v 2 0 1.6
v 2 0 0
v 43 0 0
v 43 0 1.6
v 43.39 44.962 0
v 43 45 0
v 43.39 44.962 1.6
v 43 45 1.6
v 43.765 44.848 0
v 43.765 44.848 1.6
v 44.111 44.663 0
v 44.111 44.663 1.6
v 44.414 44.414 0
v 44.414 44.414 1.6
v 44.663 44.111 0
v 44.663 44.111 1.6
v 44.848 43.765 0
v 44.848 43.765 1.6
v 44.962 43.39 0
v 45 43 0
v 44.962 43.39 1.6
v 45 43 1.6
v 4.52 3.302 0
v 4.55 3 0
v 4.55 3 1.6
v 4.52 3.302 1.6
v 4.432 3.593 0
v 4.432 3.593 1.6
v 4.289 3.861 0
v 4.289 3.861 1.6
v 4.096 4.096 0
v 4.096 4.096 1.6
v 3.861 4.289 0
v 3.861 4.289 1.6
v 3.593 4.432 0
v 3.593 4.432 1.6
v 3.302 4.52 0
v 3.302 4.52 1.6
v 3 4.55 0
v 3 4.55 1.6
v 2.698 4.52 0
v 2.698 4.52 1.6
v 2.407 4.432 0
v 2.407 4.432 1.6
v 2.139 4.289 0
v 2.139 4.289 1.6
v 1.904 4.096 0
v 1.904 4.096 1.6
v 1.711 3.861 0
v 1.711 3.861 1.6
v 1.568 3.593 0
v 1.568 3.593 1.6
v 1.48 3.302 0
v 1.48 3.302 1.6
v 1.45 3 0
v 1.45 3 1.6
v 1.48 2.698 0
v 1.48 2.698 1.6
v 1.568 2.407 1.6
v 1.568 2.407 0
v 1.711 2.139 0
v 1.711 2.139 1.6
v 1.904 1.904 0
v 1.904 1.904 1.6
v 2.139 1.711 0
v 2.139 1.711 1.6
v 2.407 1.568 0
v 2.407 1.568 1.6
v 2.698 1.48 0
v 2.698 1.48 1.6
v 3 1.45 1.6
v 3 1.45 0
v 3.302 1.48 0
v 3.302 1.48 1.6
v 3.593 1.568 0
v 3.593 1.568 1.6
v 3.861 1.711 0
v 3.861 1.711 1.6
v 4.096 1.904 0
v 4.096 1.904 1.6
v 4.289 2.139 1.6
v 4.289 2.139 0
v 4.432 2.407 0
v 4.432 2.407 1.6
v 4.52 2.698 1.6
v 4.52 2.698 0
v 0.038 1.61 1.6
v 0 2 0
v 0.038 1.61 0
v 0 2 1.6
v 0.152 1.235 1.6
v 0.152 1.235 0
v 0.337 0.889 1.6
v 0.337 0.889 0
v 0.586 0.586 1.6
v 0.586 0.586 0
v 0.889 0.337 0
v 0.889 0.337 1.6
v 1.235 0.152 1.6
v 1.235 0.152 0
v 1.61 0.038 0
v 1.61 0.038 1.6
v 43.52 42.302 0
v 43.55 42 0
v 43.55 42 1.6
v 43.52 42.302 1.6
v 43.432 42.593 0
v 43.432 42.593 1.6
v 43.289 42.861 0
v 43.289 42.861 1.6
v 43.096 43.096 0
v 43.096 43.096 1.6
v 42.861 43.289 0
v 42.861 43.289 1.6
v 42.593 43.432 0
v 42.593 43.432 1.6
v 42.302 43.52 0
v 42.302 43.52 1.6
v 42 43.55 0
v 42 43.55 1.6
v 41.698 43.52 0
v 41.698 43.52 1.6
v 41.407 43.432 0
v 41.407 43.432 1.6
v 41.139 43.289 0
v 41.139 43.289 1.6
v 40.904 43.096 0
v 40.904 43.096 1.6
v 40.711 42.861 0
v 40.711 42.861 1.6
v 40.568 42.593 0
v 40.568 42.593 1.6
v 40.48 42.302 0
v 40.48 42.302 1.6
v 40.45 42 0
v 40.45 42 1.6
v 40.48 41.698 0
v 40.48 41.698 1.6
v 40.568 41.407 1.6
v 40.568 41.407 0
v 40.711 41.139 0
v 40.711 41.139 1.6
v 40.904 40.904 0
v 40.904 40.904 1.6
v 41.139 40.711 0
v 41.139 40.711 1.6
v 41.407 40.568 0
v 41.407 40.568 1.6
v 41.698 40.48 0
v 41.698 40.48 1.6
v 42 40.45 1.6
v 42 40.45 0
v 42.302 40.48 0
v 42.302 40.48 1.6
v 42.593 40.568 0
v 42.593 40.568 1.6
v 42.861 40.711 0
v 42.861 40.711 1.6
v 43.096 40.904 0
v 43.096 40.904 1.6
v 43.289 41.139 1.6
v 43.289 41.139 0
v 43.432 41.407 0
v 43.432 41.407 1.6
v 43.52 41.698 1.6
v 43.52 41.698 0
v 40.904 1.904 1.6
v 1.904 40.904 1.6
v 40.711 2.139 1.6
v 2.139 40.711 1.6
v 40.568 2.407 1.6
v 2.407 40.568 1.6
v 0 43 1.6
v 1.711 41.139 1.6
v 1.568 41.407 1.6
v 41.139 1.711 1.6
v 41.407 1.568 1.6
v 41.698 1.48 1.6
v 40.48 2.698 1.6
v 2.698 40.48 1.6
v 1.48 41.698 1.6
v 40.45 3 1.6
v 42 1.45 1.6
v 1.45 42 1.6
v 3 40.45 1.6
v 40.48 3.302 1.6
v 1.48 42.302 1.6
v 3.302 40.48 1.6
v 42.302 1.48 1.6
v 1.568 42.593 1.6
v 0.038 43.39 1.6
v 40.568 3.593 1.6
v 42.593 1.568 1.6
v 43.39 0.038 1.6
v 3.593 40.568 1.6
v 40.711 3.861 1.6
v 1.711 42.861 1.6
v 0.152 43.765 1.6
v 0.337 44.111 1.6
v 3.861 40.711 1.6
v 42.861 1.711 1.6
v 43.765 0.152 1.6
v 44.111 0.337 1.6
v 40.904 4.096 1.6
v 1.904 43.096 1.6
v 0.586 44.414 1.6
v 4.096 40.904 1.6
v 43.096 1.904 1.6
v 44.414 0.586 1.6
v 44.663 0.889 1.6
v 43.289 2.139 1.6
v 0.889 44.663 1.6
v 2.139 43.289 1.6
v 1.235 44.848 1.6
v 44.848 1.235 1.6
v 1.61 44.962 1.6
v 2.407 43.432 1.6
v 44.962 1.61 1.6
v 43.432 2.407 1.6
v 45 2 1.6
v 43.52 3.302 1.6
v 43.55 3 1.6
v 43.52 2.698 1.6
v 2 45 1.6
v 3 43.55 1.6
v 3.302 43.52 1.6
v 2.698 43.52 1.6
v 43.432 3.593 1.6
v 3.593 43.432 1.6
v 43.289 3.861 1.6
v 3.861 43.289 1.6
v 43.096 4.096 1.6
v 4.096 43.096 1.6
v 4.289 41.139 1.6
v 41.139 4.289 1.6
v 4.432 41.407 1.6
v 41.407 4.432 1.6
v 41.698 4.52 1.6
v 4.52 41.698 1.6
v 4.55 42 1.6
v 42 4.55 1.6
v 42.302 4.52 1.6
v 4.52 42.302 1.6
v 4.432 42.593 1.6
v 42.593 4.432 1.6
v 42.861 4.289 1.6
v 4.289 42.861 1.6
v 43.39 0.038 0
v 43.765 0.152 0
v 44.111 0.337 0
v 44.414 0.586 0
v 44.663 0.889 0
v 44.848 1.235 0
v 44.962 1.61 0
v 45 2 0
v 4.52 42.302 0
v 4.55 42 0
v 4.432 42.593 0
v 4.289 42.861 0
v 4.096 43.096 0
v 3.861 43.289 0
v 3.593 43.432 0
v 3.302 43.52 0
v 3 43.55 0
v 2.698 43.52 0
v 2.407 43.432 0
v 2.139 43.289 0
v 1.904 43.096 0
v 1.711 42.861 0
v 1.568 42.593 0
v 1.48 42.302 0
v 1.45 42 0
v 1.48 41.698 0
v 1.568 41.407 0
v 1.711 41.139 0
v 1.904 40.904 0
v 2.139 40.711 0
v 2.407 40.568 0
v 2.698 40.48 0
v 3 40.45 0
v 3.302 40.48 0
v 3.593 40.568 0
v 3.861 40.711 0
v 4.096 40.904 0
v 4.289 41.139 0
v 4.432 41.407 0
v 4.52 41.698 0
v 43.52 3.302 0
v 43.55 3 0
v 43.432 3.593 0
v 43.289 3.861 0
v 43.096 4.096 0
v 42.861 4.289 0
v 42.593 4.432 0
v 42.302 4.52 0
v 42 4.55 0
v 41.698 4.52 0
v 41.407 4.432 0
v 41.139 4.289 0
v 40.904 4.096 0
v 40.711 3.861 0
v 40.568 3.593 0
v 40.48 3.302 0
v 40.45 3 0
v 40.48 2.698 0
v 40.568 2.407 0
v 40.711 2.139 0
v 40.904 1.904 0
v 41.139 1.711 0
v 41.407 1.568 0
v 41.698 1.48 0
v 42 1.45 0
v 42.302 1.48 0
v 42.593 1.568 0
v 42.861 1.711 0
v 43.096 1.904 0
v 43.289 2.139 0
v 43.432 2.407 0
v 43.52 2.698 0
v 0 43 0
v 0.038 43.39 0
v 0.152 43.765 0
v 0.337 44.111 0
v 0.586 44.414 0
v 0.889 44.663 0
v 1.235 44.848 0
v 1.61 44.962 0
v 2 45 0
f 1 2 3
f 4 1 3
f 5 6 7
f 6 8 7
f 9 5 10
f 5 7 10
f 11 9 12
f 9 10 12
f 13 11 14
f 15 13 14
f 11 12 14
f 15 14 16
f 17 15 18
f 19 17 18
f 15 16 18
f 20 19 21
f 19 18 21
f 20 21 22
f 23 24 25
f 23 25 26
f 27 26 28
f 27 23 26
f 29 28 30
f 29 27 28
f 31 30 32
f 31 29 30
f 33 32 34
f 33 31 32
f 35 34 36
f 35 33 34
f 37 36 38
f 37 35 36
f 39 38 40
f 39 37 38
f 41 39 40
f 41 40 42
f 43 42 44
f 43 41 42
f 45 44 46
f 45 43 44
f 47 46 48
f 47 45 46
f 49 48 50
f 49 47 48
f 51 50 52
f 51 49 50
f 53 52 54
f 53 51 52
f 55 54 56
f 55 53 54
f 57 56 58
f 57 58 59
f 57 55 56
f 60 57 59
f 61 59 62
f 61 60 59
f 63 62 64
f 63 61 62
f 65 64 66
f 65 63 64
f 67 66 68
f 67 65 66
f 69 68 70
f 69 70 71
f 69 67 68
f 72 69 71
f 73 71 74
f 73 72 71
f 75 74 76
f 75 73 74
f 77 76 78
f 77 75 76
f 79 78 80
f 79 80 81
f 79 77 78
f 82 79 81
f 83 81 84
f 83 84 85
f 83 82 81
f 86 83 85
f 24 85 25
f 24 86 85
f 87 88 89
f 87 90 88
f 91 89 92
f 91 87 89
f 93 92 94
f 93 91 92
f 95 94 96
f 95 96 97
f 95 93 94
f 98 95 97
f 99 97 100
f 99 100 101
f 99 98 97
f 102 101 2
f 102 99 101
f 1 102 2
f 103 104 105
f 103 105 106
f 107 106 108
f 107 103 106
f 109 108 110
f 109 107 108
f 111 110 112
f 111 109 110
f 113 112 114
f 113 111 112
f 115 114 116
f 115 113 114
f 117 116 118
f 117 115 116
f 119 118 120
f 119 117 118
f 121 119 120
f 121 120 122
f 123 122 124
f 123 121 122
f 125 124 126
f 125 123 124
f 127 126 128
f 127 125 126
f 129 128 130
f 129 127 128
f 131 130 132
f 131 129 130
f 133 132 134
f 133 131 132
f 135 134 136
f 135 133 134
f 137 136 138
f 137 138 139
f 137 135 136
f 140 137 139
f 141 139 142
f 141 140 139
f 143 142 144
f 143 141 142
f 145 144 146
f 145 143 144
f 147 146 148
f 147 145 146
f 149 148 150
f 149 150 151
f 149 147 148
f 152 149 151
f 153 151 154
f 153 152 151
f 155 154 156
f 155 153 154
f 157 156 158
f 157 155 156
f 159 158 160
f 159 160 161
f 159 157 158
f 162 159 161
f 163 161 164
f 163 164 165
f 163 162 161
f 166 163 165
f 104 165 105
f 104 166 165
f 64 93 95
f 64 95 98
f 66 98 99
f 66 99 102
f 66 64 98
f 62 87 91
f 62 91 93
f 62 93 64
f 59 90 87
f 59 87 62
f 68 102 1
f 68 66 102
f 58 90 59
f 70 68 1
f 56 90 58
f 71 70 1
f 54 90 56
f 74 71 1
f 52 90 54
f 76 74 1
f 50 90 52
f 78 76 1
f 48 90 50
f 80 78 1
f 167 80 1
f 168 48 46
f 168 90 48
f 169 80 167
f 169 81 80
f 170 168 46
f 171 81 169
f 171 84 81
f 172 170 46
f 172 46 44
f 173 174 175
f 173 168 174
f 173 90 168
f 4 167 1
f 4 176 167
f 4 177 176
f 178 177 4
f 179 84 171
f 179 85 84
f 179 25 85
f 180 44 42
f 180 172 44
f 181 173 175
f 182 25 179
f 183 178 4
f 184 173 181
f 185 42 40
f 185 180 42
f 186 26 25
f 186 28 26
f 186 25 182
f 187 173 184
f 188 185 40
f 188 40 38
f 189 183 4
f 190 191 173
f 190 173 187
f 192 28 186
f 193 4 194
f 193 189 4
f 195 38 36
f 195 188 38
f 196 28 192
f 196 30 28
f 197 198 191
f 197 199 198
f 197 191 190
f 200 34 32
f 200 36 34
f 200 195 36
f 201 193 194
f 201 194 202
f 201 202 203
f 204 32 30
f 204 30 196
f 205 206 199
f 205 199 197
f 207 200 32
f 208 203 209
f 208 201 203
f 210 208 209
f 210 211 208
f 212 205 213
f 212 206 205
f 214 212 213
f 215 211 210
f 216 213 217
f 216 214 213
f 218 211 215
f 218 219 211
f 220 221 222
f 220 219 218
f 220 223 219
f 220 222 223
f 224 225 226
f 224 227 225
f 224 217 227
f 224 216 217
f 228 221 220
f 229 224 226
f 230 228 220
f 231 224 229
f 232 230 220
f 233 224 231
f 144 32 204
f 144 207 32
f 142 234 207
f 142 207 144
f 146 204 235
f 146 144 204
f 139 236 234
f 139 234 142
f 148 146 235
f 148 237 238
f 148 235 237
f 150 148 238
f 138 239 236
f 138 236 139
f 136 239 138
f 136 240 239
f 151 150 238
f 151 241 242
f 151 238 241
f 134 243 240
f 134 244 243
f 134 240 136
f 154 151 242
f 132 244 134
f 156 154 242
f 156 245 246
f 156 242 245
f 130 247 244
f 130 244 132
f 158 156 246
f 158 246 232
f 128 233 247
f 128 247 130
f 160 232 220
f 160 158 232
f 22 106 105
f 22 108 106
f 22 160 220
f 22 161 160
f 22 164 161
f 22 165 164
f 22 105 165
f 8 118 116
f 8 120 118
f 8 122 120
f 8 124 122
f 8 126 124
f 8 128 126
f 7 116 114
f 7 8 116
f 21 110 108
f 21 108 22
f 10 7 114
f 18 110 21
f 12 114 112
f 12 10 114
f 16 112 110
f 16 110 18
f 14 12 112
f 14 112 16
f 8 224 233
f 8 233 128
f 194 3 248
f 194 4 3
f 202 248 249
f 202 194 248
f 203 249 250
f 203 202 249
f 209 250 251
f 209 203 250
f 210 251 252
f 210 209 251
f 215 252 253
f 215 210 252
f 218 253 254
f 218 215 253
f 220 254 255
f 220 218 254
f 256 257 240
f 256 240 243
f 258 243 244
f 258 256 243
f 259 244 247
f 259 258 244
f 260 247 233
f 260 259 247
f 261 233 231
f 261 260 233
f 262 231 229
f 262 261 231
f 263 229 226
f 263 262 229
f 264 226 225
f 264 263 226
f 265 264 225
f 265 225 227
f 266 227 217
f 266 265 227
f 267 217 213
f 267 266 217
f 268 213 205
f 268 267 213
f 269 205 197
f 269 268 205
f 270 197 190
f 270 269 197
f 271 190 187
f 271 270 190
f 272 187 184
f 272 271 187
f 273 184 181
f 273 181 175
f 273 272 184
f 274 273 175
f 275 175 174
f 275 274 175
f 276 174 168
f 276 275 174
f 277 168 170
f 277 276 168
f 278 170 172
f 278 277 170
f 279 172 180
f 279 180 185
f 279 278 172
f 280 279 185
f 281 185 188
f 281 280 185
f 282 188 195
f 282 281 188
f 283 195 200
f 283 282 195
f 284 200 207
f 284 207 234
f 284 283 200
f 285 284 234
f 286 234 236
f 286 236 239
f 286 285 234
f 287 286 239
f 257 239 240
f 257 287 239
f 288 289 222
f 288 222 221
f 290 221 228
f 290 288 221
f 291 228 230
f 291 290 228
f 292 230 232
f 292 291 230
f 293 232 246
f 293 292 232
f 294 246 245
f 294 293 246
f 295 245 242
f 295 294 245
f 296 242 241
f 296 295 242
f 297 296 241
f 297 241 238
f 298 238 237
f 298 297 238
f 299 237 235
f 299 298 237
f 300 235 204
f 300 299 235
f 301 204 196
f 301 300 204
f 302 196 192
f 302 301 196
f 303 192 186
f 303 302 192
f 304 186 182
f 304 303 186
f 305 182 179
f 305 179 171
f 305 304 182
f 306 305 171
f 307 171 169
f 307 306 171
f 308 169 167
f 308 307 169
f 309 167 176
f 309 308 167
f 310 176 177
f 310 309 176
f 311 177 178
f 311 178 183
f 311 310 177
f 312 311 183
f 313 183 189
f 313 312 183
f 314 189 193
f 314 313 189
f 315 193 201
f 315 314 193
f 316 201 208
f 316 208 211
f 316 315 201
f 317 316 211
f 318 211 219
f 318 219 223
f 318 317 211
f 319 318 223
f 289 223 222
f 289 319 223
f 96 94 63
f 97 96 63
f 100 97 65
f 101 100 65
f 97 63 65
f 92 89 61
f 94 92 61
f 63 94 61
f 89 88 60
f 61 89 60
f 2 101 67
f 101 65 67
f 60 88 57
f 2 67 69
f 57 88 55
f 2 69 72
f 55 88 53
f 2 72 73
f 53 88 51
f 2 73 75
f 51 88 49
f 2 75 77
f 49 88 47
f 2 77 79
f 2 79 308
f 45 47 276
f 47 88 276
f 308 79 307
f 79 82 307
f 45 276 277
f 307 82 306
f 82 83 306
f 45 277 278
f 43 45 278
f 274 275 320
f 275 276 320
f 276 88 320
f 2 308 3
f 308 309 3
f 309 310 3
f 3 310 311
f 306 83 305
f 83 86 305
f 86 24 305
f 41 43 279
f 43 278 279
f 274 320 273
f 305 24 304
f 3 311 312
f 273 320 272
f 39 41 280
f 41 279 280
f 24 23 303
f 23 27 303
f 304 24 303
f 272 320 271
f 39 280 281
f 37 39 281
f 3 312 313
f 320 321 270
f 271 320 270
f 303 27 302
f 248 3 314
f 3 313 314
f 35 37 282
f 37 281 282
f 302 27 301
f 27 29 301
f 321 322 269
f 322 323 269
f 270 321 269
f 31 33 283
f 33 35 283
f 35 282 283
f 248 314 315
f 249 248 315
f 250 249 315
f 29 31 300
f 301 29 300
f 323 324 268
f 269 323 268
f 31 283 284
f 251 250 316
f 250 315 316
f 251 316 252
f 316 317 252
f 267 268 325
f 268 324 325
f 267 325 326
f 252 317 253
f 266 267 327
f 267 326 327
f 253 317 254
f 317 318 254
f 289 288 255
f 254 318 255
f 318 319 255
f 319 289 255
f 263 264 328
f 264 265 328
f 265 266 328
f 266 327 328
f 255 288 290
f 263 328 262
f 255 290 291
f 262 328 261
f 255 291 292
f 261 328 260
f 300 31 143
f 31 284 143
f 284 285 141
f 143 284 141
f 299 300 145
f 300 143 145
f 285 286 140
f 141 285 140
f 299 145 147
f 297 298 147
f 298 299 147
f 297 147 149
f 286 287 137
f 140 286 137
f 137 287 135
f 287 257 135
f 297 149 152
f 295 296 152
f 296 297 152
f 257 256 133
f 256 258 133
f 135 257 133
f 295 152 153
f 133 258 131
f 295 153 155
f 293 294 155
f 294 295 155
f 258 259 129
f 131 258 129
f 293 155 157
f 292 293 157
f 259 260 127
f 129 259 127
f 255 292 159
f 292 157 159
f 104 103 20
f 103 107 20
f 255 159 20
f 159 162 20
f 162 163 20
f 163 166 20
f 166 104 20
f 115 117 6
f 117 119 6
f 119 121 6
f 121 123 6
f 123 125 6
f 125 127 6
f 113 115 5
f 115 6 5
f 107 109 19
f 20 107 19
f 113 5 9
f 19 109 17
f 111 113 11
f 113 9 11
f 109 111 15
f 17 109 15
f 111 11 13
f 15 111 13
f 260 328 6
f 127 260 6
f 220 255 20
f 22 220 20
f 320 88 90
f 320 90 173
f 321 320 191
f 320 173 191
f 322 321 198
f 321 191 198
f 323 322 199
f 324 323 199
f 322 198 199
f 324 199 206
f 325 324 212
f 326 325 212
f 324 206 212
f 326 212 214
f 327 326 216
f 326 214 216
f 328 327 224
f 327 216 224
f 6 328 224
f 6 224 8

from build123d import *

# Parameters (mm, degrees)
SKIZZE1_W                       = 45
SKIZZE1_H                       = 45
SKIZZE1_R                       = 1.55
AUFSATZ_LINEAR_AUSTRAGEN1_DEPTH = 1.6
VERRUNDUNG1_R                   = 2


with BuildPart() as part:
    # Skizze1 → Aufsatz-Linear austragen1 (new body)
    with BuildSketch(Plane.XY):
        with Locations((22.5, 22.5)):
            Rectangle(SKIZZE1_W, SKIZZE1_H)
        with Locations((3, 42)):
            Circle(SKIZZE1_R, mode=Mode.SUBTRACT)
        with Locations((42, 42)):
            Circle(SKIZZE1_R, mode=Mode.SUBTRACT)
        with Locations((42, 3)):
            Circle(SKIZZE1_R, mode=Mode.SUBTRACT)
        with Locations((3, 3)):
            Circle(SKIZZE1_R, mode=Mode.SUBTRACT)
    extrude(amount=AUFSATZ_LINEAR_AUSTRAGEN1_DEPTH)

    # Verrundung1
    verrundung1_edges = [part.edges().sort_by_distance(p)[0] for p in [
        (0, 45, 0.8),
        (45, 45, 0.8),
        (45, 0, 0.8),
        (0, 0, 0.8),
    ]]
    fillet(verrundung1_edges, radius=VERRUNDUNG1_R)


solid = part.part
